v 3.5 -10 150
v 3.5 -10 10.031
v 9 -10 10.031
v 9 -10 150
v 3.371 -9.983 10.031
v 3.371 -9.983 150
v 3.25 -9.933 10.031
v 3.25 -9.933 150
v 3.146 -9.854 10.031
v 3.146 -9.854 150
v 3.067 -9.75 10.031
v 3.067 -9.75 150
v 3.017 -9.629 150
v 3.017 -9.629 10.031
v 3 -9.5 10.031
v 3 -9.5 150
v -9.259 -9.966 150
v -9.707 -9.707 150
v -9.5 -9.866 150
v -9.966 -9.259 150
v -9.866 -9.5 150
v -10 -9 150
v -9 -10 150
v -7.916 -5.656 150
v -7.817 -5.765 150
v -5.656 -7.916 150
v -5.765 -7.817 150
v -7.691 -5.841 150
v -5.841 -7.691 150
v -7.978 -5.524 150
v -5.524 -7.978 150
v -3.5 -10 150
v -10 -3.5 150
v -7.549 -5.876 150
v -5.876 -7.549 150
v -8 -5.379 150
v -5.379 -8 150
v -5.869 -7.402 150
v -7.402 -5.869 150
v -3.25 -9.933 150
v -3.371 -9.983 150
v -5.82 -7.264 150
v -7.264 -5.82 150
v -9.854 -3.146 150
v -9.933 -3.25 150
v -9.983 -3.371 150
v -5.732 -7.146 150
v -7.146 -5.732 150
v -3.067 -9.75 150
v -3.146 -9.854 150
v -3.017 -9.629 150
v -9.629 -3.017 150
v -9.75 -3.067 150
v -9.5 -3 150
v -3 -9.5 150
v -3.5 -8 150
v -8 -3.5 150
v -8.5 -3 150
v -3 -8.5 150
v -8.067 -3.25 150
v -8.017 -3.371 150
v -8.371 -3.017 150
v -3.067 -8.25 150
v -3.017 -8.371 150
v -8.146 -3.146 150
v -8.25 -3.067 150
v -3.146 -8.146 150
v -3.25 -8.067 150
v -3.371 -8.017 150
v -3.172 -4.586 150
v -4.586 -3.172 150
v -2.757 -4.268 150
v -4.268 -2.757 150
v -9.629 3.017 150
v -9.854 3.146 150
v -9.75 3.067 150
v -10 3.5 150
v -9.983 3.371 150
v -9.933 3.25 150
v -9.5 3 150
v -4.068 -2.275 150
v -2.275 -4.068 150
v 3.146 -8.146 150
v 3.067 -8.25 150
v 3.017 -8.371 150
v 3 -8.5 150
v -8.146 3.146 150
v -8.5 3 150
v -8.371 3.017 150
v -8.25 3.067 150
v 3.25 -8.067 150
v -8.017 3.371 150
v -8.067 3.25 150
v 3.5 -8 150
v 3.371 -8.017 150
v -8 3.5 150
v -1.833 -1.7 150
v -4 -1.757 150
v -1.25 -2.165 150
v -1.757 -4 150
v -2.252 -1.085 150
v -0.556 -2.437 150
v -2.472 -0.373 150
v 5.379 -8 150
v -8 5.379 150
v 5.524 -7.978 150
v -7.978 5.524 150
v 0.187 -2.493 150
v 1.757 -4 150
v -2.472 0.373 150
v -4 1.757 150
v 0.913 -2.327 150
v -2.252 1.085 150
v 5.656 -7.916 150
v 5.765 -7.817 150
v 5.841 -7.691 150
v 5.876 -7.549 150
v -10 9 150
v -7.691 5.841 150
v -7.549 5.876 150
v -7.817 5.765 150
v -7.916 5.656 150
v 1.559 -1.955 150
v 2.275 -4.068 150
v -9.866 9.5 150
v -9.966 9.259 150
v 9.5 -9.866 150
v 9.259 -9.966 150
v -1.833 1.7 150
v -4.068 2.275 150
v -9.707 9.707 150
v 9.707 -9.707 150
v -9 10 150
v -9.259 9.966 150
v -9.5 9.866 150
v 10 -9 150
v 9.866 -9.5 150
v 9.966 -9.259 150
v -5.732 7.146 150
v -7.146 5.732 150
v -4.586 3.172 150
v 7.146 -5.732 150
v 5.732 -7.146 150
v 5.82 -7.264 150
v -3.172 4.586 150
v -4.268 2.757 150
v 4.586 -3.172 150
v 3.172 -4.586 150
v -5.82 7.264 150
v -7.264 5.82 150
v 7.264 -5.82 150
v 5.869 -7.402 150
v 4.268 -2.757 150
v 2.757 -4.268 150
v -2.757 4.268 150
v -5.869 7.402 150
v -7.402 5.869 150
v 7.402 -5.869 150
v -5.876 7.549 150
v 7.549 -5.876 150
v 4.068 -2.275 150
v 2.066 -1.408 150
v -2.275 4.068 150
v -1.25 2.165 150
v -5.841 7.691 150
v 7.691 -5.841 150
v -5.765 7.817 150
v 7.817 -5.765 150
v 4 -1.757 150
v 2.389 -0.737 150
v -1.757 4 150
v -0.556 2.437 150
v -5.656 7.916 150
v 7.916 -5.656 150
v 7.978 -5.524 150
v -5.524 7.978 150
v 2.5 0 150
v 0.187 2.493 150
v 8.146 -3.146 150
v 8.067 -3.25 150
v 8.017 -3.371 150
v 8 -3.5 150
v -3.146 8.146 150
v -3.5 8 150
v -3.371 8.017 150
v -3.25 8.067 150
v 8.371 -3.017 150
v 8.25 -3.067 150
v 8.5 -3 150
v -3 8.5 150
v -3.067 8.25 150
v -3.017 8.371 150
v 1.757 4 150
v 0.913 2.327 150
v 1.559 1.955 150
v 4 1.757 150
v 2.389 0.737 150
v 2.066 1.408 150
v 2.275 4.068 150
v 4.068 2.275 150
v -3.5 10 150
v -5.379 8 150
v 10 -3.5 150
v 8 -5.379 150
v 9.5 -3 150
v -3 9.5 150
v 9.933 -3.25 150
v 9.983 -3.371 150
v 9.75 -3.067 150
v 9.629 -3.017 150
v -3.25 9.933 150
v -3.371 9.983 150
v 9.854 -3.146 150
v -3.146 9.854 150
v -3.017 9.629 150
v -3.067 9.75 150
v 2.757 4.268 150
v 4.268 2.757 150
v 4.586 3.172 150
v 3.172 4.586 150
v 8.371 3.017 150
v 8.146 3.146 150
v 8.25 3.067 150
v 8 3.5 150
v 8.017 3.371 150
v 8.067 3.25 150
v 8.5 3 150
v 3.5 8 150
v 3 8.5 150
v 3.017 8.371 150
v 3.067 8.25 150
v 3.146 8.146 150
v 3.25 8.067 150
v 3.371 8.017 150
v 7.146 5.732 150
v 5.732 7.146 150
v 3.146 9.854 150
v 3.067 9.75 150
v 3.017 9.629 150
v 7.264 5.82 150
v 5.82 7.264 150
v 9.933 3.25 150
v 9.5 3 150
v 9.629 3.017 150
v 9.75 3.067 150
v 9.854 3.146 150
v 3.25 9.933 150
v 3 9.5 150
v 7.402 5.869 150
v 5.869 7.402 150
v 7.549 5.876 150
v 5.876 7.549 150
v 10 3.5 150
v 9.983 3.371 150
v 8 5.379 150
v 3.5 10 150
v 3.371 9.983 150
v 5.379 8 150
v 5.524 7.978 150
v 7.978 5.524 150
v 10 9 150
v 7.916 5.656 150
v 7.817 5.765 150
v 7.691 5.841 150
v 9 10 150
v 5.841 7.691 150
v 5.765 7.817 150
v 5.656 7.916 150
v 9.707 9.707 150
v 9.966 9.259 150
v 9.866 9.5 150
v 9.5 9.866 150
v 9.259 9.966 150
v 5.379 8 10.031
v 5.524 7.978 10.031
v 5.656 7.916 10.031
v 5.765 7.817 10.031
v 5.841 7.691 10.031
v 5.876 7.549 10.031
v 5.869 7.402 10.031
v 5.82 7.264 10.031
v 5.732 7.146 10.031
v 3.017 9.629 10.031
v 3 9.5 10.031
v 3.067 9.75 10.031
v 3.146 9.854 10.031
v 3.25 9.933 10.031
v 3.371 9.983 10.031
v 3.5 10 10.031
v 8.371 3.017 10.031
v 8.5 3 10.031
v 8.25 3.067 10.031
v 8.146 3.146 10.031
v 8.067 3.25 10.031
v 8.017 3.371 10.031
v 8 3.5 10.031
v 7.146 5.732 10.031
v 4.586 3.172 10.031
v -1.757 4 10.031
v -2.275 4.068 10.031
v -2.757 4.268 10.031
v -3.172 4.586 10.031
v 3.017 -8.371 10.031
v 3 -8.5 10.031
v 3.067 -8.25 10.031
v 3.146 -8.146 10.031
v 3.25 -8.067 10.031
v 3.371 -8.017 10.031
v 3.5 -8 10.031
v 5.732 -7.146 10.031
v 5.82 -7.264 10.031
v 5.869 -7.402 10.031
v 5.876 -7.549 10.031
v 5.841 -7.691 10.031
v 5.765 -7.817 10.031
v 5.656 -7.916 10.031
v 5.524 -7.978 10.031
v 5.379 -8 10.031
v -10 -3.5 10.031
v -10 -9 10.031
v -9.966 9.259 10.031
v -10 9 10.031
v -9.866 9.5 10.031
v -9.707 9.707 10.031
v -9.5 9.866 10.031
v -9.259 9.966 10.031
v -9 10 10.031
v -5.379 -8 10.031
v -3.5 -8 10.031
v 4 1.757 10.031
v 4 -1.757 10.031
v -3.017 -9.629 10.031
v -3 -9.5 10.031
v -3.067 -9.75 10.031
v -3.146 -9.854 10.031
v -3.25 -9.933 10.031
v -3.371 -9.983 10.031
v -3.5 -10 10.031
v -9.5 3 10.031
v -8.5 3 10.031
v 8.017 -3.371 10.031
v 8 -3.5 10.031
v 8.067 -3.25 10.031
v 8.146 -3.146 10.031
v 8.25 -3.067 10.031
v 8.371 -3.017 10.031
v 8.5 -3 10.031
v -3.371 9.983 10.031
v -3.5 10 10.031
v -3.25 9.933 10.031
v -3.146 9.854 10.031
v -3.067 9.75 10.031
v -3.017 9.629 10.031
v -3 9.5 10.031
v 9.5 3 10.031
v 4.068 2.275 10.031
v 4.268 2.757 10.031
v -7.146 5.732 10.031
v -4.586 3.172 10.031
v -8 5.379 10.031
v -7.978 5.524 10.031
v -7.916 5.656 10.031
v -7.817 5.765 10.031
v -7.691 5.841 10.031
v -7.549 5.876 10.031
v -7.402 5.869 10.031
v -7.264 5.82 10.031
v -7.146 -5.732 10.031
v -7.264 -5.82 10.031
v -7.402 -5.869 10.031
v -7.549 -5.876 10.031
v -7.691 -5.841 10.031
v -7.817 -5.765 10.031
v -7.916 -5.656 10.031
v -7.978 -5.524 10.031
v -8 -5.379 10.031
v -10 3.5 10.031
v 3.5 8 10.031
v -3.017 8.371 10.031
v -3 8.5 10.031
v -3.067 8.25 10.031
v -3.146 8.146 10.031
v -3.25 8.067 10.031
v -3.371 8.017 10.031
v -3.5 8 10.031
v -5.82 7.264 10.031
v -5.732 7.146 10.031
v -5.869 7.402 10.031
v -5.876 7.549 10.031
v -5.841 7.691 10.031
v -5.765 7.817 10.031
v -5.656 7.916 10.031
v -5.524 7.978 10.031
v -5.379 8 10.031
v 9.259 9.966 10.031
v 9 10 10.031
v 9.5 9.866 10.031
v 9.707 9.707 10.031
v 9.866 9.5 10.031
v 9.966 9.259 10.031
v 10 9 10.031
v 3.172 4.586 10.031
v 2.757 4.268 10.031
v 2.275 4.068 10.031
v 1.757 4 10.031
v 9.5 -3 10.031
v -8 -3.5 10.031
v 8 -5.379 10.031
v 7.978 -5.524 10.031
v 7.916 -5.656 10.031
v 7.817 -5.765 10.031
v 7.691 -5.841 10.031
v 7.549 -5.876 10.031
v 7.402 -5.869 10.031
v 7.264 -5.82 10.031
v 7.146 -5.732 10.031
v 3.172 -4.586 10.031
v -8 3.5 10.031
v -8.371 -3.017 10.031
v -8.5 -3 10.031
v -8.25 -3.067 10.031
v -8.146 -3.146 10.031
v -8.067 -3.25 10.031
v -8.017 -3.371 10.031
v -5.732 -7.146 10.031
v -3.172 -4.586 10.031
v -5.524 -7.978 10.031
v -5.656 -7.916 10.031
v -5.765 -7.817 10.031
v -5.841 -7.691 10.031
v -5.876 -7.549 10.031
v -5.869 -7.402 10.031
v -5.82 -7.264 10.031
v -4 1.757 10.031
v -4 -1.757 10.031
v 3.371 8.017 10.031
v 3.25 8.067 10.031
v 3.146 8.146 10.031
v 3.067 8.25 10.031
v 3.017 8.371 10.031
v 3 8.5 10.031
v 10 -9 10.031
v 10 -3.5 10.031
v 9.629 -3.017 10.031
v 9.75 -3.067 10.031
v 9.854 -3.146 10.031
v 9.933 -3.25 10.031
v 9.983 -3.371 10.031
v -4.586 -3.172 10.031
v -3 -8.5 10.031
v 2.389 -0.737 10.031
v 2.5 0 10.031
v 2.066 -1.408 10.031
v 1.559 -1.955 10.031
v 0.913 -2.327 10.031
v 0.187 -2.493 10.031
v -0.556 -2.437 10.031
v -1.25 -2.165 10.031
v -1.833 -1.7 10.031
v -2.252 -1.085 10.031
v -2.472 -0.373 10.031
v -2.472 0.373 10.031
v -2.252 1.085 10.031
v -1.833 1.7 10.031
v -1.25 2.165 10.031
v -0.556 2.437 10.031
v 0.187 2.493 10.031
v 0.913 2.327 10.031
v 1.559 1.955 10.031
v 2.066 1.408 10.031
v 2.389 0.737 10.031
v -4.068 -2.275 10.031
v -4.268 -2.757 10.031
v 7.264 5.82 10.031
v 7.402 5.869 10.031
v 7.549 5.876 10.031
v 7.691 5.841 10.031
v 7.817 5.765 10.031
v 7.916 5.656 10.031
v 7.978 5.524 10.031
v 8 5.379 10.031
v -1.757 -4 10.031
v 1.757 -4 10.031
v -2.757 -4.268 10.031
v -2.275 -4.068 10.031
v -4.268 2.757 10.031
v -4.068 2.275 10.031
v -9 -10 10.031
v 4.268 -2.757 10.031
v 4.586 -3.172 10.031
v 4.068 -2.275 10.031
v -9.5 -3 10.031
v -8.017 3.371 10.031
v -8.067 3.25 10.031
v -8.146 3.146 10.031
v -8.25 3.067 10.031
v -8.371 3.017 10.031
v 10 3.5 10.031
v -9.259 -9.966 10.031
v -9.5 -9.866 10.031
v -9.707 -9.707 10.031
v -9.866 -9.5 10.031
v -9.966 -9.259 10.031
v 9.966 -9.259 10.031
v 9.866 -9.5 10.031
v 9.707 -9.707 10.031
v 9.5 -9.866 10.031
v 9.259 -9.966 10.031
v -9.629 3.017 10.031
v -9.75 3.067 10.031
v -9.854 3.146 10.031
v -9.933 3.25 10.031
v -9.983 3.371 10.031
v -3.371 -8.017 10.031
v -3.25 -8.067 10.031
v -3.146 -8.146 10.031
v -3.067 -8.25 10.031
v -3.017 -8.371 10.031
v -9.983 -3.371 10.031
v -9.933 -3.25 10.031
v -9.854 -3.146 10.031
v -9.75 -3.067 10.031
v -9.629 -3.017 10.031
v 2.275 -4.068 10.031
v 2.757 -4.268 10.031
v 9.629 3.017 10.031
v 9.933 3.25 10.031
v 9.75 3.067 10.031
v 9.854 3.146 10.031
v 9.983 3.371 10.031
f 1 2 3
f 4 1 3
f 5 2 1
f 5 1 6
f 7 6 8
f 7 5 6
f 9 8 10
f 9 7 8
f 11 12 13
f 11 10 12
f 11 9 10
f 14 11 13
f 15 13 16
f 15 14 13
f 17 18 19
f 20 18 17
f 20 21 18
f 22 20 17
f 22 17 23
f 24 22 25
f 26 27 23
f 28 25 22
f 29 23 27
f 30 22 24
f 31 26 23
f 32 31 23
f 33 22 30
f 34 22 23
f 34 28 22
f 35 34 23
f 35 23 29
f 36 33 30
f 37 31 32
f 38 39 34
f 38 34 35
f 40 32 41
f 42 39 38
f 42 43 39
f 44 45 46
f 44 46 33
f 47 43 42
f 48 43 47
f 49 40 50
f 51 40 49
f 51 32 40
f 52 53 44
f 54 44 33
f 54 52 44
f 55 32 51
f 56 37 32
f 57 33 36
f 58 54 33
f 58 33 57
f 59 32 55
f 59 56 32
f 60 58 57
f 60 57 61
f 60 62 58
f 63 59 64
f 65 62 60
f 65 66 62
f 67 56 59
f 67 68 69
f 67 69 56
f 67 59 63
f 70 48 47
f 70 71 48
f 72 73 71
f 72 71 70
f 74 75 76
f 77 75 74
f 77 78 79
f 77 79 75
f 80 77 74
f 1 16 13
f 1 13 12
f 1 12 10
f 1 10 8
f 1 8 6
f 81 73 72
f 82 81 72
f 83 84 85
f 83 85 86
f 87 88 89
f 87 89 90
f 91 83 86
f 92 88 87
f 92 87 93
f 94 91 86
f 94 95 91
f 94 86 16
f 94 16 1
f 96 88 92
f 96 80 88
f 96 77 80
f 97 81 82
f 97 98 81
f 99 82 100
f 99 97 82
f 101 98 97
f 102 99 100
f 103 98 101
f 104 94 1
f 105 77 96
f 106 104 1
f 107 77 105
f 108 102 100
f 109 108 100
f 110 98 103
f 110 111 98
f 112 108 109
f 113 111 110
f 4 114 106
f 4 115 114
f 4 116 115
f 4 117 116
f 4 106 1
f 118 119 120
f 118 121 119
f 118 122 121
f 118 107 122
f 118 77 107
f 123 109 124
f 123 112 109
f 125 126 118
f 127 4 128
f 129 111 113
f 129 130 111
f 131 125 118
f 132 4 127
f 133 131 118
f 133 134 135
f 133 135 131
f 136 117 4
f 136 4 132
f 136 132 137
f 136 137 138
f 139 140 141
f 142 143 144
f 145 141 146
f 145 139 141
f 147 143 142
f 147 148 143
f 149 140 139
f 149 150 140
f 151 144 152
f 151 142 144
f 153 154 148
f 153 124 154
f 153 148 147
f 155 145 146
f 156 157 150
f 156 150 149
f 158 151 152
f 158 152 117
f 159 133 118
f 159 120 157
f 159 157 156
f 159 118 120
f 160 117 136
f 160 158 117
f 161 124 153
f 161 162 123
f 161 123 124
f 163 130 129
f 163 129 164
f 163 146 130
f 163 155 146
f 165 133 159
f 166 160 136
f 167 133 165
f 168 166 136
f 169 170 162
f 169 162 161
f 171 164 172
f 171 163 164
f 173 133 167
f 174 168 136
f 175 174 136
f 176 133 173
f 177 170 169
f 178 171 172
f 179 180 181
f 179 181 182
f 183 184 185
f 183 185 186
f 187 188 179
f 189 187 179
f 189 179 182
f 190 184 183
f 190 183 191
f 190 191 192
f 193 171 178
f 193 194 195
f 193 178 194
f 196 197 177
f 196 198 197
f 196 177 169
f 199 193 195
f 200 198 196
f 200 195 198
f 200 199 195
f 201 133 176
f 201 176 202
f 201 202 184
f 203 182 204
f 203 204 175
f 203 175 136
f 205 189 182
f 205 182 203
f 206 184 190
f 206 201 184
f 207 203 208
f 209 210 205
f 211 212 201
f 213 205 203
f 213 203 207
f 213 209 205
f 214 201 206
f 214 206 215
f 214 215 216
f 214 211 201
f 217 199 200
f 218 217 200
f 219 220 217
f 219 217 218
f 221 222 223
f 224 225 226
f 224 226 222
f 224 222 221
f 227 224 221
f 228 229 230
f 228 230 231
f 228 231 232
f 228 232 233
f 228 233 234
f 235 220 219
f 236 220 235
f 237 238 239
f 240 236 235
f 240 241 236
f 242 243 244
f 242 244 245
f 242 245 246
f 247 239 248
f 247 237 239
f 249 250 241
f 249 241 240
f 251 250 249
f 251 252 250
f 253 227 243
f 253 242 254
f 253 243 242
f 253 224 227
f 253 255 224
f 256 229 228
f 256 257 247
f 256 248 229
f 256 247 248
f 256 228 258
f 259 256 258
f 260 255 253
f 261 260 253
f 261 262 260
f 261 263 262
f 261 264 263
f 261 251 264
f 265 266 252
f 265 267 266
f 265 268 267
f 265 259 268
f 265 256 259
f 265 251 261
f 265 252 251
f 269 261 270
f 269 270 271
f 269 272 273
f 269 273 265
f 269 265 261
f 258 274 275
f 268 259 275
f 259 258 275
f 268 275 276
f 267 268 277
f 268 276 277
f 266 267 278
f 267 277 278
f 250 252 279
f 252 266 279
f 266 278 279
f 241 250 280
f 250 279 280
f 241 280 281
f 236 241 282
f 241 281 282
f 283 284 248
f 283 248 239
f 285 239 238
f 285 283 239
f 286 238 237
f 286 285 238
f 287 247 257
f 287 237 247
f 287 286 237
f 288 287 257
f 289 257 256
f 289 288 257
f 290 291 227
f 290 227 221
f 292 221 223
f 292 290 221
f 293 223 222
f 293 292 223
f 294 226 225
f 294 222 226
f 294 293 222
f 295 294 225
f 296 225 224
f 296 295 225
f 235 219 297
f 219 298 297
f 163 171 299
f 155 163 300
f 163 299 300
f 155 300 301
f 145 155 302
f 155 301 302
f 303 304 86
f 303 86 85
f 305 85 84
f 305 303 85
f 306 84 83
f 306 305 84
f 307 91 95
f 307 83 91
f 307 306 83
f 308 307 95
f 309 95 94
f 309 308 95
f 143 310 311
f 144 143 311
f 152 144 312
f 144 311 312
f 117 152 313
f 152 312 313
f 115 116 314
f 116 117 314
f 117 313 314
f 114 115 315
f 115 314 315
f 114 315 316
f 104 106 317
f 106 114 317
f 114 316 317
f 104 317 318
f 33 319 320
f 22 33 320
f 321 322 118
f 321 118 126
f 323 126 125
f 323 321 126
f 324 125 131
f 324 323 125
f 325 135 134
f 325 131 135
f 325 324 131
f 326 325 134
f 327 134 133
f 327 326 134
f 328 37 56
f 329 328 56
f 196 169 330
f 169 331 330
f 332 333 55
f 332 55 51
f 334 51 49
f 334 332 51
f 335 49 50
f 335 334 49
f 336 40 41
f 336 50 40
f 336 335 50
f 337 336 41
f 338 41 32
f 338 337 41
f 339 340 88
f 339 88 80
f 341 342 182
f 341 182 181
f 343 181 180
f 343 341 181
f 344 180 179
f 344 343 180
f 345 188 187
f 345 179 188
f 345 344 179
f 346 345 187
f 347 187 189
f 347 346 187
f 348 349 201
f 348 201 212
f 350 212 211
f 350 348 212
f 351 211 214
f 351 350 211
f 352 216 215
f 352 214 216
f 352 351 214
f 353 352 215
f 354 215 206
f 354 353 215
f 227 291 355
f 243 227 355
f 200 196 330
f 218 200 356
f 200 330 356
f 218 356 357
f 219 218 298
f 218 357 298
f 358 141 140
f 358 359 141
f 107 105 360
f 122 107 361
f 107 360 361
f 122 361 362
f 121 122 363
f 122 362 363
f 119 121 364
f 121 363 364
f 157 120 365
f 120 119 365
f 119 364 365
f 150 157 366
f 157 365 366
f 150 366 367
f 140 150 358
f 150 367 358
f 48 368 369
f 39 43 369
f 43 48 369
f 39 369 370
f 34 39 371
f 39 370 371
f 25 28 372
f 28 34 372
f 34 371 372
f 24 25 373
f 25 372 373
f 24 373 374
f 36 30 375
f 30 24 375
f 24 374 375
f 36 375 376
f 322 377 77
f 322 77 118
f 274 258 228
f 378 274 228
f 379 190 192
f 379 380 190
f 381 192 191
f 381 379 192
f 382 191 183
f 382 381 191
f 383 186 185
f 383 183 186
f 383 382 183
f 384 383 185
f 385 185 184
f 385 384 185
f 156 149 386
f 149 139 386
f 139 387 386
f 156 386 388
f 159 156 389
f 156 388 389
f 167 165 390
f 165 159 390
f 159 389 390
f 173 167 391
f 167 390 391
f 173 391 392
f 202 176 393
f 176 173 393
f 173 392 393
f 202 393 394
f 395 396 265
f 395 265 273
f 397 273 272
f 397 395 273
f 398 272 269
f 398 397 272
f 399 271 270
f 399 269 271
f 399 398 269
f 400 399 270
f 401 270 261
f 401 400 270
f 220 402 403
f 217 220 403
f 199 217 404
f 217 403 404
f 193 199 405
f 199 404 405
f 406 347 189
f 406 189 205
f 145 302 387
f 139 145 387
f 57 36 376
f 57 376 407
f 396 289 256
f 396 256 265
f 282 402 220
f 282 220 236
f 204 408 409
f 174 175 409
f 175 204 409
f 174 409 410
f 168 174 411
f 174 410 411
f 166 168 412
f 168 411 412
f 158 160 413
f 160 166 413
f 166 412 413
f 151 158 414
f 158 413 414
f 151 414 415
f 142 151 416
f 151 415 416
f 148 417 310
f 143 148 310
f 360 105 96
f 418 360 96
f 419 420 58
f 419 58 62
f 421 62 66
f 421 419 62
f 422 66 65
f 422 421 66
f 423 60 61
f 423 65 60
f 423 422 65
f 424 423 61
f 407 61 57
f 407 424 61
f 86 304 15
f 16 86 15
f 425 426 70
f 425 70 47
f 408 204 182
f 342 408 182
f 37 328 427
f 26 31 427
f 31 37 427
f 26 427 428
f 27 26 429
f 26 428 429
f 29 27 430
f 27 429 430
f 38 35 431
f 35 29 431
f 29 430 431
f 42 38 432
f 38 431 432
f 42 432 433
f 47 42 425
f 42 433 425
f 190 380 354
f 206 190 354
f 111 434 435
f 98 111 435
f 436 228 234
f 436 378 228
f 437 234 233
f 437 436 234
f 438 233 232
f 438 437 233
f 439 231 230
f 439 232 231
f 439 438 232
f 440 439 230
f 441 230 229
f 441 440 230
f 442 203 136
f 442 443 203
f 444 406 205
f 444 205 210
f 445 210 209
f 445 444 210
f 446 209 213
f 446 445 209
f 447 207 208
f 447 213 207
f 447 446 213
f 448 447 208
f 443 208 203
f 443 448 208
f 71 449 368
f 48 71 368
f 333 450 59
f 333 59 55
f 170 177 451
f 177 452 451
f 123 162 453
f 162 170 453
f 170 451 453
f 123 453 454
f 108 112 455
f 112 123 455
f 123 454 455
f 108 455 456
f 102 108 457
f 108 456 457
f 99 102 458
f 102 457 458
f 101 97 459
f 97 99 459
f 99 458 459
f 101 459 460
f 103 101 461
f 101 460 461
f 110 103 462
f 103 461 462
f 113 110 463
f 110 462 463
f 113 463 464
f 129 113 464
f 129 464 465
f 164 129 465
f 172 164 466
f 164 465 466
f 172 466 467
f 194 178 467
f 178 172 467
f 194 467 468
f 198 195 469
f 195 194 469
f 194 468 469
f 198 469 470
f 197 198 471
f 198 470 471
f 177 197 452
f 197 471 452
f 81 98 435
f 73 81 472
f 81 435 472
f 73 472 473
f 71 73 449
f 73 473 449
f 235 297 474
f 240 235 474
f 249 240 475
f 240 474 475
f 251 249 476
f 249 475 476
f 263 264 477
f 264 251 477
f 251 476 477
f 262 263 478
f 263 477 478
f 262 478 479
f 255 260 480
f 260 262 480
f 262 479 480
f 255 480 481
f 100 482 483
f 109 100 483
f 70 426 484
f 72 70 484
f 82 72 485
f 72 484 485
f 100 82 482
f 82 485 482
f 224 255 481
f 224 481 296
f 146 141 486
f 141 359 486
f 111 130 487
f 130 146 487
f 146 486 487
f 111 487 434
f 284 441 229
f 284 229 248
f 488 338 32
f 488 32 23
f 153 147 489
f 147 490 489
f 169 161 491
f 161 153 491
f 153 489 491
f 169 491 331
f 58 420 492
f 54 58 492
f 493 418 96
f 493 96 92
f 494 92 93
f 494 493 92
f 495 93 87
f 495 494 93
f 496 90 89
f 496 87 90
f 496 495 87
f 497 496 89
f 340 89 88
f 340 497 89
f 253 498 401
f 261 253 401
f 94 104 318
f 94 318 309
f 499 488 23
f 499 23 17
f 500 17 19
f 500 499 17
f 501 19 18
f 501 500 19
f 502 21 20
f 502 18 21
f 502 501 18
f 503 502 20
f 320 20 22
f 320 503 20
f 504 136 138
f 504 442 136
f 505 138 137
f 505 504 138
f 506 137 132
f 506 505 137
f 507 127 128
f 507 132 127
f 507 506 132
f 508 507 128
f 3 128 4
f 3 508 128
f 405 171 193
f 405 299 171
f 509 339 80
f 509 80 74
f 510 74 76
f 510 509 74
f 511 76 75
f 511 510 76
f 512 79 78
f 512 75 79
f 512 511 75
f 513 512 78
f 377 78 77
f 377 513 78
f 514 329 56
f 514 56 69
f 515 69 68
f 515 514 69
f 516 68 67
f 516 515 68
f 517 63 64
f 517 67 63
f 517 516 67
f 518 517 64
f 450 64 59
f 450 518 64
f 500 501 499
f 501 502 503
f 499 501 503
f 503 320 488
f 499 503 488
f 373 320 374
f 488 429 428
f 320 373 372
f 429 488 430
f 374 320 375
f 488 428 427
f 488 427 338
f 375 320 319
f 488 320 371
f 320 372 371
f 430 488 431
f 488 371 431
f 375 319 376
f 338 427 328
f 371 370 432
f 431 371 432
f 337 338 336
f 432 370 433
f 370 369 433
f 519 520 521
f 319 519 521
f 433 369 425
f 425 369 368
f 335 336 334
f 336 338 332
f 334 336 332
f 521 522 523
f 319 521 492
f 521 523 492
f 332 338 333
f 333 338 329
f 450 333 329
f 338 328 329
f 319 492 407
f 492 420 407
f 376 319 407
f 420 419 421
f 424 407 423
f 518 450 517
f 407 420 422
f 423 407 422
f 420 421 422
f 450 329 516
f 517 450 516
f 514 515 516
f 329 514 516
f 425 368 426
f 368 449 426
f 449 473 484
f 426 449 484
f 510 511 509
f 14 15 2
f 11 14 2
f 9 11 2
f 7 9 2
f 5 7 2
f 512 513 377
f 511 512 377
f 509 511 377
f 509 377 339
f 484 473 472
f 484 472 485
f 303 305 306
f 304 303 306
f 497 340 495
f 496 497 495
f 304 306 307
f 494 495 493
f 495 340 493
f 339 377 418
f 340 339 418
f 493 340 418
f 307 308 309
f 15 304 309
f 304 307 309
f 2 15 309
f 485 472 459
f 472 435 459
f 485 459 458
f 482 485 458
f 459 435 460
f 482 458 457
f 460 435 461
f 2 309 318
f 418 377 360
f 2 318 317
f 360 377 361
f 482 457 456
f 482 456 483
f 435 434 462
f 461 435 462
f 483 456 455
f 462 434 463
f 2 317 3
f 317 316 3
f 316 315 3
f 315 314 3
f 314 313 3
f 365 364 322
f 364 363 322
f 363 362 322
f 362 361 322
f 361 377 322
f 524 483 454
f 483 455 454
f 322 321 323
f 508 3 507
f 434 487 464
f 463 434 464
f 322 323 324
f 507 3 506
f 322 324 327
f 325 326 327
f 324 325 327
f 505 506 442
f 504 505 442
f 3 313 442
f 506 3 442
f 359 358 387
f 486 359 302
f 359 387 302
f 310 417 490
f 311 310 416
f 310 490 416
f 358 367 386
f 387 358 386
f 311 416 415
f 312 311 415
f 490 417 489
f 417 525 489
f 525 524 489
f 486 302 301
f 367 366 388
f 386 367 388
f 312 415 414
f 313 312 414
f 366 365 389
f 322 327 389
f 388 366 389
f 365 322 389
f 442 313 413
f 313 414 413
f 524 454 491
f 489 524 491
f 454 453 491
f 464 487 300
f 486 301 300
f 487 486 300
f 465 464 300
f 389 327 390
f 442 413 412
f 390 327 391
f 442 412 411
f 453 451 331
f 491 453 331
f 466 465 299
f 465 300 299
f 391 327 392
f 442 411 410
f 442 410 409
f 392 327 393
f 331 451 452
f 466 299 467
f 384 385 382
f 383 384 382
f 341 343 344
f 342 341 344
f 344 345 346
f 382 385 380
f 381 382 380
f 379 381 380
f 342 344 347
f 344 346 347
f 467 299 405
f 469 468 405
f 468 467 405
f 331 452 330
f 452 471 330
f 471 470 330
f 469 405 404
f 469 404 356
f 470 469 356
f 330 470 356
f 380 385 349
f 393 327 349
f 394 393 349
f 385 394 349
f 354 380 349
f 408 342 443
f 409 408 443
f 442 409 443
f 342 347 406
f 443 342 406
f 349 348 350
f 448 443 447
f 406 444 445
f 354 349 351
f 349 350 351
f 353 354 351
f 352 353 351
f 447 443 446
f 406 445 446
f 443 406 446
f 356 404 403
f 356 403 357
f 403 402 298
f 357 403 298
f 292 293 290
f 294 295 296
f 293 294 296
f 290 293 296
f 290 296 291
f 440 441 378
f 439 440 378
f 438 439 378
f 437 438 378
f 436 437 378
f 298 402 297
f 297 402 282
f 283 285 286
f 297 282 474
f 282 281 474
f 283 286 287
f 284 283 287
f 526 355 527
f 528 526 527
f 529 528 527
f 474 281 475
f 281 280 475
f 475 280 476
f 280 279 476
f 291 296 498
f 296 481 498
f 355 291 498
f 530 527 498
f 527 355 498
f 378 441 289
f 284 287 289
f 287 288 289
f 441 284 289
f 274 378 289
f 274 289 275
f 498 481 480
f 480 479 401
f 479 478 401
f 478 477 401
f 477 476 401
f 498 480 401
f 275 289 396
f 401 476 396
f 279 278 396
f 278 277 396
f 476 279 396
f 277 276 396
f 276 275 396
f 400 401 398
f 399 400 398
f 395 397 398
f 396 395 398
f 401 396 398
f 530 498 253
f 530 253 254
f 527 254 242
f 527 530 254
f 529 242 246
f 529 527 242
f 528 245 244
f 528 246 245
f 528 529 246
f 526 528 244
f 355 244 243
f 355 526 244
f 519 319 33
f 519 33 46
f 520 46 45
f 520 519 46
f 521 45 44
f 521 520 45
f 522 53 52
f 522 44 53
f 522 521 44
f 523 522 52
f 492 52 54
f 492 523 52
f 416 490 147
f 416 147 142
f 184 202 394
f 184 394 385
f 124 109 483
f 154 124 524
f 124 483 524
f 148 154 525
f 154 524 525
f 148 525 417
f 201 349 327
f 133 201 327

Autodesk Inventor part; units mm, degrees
ref_plane "Start Plane" through (0, 0, 10.031) normal (0, 0, 1) x (1, 0, 0)
ref_plane "End Plane" through (0, 0, 150) normal (0, 0, 1) x (1, 0, 0)
sketch "Sketch" plane through (0, 0, 0) normal (0, 0, 1) x (1, 0, 0)
  line L0 (0, 0) -> (2.5, 0) construction
  line L1 (0, 0) -> (0, 2.5) construction
  line L2 (0, 4) -> (0, -4) construction
  line L3 (0, 4) -> (1.7574, 4)
  arc A0 (1.7574, 4) -> (3.1716, 4.5858) centre (1.7574, 6) ccw
  line L4 (3.1716, 4.5858) -> (5.7322, 7.1464)
  line L5 (-4, 0) -> (4, 0) construction
  line L6 (4, 0) -> (4, 1.7574)
  arc A1 (4.5858, 3.1716) -> (4, 1.7574) centre (6, 1.7574) ccw
  line L7 (4.5858, 3.1716) -> (7.1464, 5.7322)
  line L8 (0, 0) -> (10, 10) construction
  line L9 (0, 0) -> (19.6827, 0) construction
  arc A2 (8, 5.3787) -> (7.1464, 5.7322) centre (7.5, 5.3787) ccw
  line L10 (8, 5.3787) -> (8, 3.5)
  arc A3 (8, 3.5) -> (8.5, 3) centre (8.5, 3.5) ccw
  line L11 (8.5, 3) -> (9.5, 3)
  arc A4 (9.5, 3) -> (10, 3.5) centre (9.5, 3.5) ccw
  line L12 (10, 3.5) -> (10, 9)
  line L13 (10, 9) -> (10, 10) construction
  arc A5 (5.7322, 7.1464) -> (5.3787, 8) centre (5.3787, 7.5) ccw
  line L14 (5.3787, 8) -> (3.5, 8)
  arc A6 (3, 8.5) -> (3.5, 8) centre (3.5, 8.5) ccw
  line L15 (3, 8.5) -> (3, 9.5)
  arc A7 (3.5, 10) -> (3, 9.5) centre (3.5, 9.5) ccw
  line L16 (3.5, 10) -> (9, 10)
  arc A8 (10, 9) -> (9, 10) centre (9, 9) ccw
  line L17 (0, 4) -> (-1.7574, 4)
  arc A9 (-3.1716, 4.5858) -> (-1.7574, 4) centre (-1.7574, 6) ccw
  line L18 (-3.1716, 4.5858) -> (-5.7322, 7.1464)
  line L19 (-4, 0) -> (-4, 1.7574)
  arc A10 (-4, 1.7574) -> (-4.5858, 3.1716) centre (-6, 1.7574) ccw
  line L20 (-4.5858, 3.1716) -> (-7.1464, 5.7322)
  arc A11 (-7.1464, 5.7322) -> (-8, 5.3787) centre (-7.5, 5.3787) ccw
  line L21 (-8, 5.3787) -> (-8, 3.5)
  arc A12 (-8.5, 3) -> (-8, 3.5) centre (-8.5, 3.5) ccw
  line L22 (-8.5, 3) -> (-9.5, 3)
  arc A13 (-10, 3.5) -> (-9.5, 3) centre (-9.5, 3.5) ccw
  line L23 (-10, 3.5) -> (-10, 9)
  arc A14 (-5.3787, 8) -> (-5.7322, 7.1464) centre (-5.3787, 7.5) ccw
  line L24 (-5.3787, 8) -> (-3.5, 8)
  arc A15 (-3.5, 8) -> (-3, 8.5) centre (-3.5, 8.5) ccw
  line L25 (-3, 8.5) -> (-3, 9.5)
  arc A16 (-3, 9.5) -> (-3.5, 10) centre (-3.5, 9.5) ccw
  line L26 (-3.5, 10) -> (-9, 10)
  arc A17 (-9, 10) -> (-10, 9) centre (-9, 9) ccw
  line L27 (0, -4) -> (-1.7574, -4)
  arc A18 (-1.7574, -4) -> (-3.1716, -4.5858) centre (-1.7574, -6) ccw
  line L28 (-3.1716, -4.5858) -> (-5.7322, -7.1464)
  arc A19 (-5.7322, -7.1464) -> (-5.3787, -8) centre (-5.3787, -7.5) ccw
  line L29 (-5.3787, -8) -> (-3.5, -8)
  arc A20 (-3, -8.5) -> (-3.5, -8) centre (-3.5, -8.5) ccw
  line L30 (-3, -8.5) -> (-3, -9.5)
  arc A21 (-3.5, -10) -> (-3, -9.5) centre (-3.5, -9.5) ccw
  line L31 (-3.5, -10) -> (-9, -10)
  arc A22 (-10, -9) -> (-9, -10) centre (-9, -9) ccw
  line L32 (-10, -3.5) -> (-10, -9)
  arc A23 (-9.5, -3) -> (-10, -3.5) centre (-9.5, -3.5) ccw
  line L33 (-8.5, -3) -> (-9.5, -3)
  arc A24 (-8, -3.5) -> (-8.5, -3) centre (-8.5, -3.5) ccw
  line L34 (-8, -5.3787) -> (-8, -3.5)
  arc A25 (-8, -5.3787) -> (-7.1464, -5.7322) centre (-7.5, -5.3787) ccw
  line L35 (-4.5858, -3.1716) -> (-7.1464, -5.7322)
  arc A26 (-4.5858, -3.1716) -> (-4, -1.7574) centre (-6, -1.7574) ccw
  line L36 (-4, 0) -> (-4, -1.7574)
  line L37 (3.5, -10) -> (9, -10)
  arc A27 (9, -10) -> (10, -9) centre (9, -9) ccw
  line L38 (10, -3.5) -> (10, -9)
  arc A28 (10, -3.5) -> (9.5, -3) centre (9.5, -3.5) ccw
  line L39 (8.5, -3) -> (9.5, -3)
  arc A29 (8.5, -3) -> (8, -3.5) centre (8.5, -3.5) ccw
  line L40 (8, -5.3787) -> (8, -3.5)
  arc A30 (7.1464, -5.7322) -> (8, -5.3787) centre (7.5, -5.3787) ccw
  line L41 (4.5858, -3.1716) -> (7.1464, -5.7322)
  arc A31 (4, -1.7574) -> (4.5858, -3.1716) centre (6, -1.7574) ccw
  line L42 (4, 0) -> (4, -1.7574)
  line L43 (5.3787, -8) -> (3.5, -8)
  arc A32 (5.3787, -8) -> (5.7322, -7.1464) centre (5.3787, -7.5) ccw
  line L44 (3.1716, -4.5858) -> (5.7322, -7.1464)
  arc A33 (3.1716, -4.5858) -> (1.7574, -4) centre (1.7574, -6) ccw
  line L45 (0, -4) -> (1.7574, -4)
  arc A34 (3.5, -8) -> (3, -8.5) centre (3.5, -8.5) ccw
  line L46 (3, -8.5) -> (3, -9.5)
  arc A35 (3, -9.5) -> (3.5, -10) centre (3.5, -9.5) ccw
  circle A36 centre (0, 0) radius 2.5
  dimension "d1" = 8
  dimension "d2" = 2
  dimension "d3" = 8
  dimension "d4" = 2
  dimension "d5" = 2
  dimension "d7" = 45
  dimension "d8" = 0.5
  dimension "d9" = 0.5
  dimension "d10" = 0.5
  dimension "d12" = 2
  dimension "d17" = 7
  dimension "d18" = 10
  dimension "d19" = 0.5
  dimension "d20" = 1
  dimension "d21" = 0.5
  dimension "d22" = 0.5
  dimension "d23" = 2
  dimension "d24" = 7
  dimension "d25" = 5
extrude "Body" add sketch "Sketch" along normal up to surface (139.969 mm away) from surface at 10.031
sketch "Sketch6" plane through (0, 0, 0) normal (0, 0, 1) x (1, 0, 0)
  line L0 (0, 0) -> (10, 0)
ref_plane "Work Plane5" through (0, 0, 0) normal (0, -1, 0) x (1, 0, 0)
sketch "Sketch7" plane through (0, 0, 0) normal (0, -1, 0) x (1, 0, 0)
  line L0 (-2, 10.031) -> (12, 10.031)
  line L1 (-2, 150) -> (12, 150)
  dimension "d33" = 139.969
ref_plane "Work Plane6" through (-400, 9, 10.031) normal (0, 0, -1) x (-1, 0, 0)
split "Split1" plane through (-400, 9, 10.031) removes the side toward (0, 0, -1)
equation "\"d1\" = 8 * sigma"
equation "\"d2\" = 2 * sigma"
equation "\"d3\" = 8 * sigma"
equation "\"d4\" = 2 * sigma"
equation "\"d5\" = 2 * sigma"
equation "\"d8\" = 0.5 * sigma"
equation "\"d9\" = 0.5 * sigma"
equation "\"d10\" = 0.5 * sigma"
equation "\"d12\" = 2 * sigma"
equation "\"d17\" = 7 * sigma"
equation "\"d18\" = sigma"
equation "\"d19\" = 0.5 * sigma"
equation "\"d20\" = sigma"
equation "\"d21\" = 0.5 * sigma"
equation "\"d22\" = 0.5 * sigma"
equation "\"d23\" = 2 * sigma"
equation "\"d24\" = 7 * sigma"
equation "\"d25\" = 5 * sigma"
equation "\"sigma\" = 1"
equation "\"G_OFFSET_START\" = -10.031"
equation "\"G_OFFSET_END\" = 0"
equation "\"d28\" = -G_OFFSET_START"
equation "\"G_L\" = d33"
properties part number "A3.3-MEM"
